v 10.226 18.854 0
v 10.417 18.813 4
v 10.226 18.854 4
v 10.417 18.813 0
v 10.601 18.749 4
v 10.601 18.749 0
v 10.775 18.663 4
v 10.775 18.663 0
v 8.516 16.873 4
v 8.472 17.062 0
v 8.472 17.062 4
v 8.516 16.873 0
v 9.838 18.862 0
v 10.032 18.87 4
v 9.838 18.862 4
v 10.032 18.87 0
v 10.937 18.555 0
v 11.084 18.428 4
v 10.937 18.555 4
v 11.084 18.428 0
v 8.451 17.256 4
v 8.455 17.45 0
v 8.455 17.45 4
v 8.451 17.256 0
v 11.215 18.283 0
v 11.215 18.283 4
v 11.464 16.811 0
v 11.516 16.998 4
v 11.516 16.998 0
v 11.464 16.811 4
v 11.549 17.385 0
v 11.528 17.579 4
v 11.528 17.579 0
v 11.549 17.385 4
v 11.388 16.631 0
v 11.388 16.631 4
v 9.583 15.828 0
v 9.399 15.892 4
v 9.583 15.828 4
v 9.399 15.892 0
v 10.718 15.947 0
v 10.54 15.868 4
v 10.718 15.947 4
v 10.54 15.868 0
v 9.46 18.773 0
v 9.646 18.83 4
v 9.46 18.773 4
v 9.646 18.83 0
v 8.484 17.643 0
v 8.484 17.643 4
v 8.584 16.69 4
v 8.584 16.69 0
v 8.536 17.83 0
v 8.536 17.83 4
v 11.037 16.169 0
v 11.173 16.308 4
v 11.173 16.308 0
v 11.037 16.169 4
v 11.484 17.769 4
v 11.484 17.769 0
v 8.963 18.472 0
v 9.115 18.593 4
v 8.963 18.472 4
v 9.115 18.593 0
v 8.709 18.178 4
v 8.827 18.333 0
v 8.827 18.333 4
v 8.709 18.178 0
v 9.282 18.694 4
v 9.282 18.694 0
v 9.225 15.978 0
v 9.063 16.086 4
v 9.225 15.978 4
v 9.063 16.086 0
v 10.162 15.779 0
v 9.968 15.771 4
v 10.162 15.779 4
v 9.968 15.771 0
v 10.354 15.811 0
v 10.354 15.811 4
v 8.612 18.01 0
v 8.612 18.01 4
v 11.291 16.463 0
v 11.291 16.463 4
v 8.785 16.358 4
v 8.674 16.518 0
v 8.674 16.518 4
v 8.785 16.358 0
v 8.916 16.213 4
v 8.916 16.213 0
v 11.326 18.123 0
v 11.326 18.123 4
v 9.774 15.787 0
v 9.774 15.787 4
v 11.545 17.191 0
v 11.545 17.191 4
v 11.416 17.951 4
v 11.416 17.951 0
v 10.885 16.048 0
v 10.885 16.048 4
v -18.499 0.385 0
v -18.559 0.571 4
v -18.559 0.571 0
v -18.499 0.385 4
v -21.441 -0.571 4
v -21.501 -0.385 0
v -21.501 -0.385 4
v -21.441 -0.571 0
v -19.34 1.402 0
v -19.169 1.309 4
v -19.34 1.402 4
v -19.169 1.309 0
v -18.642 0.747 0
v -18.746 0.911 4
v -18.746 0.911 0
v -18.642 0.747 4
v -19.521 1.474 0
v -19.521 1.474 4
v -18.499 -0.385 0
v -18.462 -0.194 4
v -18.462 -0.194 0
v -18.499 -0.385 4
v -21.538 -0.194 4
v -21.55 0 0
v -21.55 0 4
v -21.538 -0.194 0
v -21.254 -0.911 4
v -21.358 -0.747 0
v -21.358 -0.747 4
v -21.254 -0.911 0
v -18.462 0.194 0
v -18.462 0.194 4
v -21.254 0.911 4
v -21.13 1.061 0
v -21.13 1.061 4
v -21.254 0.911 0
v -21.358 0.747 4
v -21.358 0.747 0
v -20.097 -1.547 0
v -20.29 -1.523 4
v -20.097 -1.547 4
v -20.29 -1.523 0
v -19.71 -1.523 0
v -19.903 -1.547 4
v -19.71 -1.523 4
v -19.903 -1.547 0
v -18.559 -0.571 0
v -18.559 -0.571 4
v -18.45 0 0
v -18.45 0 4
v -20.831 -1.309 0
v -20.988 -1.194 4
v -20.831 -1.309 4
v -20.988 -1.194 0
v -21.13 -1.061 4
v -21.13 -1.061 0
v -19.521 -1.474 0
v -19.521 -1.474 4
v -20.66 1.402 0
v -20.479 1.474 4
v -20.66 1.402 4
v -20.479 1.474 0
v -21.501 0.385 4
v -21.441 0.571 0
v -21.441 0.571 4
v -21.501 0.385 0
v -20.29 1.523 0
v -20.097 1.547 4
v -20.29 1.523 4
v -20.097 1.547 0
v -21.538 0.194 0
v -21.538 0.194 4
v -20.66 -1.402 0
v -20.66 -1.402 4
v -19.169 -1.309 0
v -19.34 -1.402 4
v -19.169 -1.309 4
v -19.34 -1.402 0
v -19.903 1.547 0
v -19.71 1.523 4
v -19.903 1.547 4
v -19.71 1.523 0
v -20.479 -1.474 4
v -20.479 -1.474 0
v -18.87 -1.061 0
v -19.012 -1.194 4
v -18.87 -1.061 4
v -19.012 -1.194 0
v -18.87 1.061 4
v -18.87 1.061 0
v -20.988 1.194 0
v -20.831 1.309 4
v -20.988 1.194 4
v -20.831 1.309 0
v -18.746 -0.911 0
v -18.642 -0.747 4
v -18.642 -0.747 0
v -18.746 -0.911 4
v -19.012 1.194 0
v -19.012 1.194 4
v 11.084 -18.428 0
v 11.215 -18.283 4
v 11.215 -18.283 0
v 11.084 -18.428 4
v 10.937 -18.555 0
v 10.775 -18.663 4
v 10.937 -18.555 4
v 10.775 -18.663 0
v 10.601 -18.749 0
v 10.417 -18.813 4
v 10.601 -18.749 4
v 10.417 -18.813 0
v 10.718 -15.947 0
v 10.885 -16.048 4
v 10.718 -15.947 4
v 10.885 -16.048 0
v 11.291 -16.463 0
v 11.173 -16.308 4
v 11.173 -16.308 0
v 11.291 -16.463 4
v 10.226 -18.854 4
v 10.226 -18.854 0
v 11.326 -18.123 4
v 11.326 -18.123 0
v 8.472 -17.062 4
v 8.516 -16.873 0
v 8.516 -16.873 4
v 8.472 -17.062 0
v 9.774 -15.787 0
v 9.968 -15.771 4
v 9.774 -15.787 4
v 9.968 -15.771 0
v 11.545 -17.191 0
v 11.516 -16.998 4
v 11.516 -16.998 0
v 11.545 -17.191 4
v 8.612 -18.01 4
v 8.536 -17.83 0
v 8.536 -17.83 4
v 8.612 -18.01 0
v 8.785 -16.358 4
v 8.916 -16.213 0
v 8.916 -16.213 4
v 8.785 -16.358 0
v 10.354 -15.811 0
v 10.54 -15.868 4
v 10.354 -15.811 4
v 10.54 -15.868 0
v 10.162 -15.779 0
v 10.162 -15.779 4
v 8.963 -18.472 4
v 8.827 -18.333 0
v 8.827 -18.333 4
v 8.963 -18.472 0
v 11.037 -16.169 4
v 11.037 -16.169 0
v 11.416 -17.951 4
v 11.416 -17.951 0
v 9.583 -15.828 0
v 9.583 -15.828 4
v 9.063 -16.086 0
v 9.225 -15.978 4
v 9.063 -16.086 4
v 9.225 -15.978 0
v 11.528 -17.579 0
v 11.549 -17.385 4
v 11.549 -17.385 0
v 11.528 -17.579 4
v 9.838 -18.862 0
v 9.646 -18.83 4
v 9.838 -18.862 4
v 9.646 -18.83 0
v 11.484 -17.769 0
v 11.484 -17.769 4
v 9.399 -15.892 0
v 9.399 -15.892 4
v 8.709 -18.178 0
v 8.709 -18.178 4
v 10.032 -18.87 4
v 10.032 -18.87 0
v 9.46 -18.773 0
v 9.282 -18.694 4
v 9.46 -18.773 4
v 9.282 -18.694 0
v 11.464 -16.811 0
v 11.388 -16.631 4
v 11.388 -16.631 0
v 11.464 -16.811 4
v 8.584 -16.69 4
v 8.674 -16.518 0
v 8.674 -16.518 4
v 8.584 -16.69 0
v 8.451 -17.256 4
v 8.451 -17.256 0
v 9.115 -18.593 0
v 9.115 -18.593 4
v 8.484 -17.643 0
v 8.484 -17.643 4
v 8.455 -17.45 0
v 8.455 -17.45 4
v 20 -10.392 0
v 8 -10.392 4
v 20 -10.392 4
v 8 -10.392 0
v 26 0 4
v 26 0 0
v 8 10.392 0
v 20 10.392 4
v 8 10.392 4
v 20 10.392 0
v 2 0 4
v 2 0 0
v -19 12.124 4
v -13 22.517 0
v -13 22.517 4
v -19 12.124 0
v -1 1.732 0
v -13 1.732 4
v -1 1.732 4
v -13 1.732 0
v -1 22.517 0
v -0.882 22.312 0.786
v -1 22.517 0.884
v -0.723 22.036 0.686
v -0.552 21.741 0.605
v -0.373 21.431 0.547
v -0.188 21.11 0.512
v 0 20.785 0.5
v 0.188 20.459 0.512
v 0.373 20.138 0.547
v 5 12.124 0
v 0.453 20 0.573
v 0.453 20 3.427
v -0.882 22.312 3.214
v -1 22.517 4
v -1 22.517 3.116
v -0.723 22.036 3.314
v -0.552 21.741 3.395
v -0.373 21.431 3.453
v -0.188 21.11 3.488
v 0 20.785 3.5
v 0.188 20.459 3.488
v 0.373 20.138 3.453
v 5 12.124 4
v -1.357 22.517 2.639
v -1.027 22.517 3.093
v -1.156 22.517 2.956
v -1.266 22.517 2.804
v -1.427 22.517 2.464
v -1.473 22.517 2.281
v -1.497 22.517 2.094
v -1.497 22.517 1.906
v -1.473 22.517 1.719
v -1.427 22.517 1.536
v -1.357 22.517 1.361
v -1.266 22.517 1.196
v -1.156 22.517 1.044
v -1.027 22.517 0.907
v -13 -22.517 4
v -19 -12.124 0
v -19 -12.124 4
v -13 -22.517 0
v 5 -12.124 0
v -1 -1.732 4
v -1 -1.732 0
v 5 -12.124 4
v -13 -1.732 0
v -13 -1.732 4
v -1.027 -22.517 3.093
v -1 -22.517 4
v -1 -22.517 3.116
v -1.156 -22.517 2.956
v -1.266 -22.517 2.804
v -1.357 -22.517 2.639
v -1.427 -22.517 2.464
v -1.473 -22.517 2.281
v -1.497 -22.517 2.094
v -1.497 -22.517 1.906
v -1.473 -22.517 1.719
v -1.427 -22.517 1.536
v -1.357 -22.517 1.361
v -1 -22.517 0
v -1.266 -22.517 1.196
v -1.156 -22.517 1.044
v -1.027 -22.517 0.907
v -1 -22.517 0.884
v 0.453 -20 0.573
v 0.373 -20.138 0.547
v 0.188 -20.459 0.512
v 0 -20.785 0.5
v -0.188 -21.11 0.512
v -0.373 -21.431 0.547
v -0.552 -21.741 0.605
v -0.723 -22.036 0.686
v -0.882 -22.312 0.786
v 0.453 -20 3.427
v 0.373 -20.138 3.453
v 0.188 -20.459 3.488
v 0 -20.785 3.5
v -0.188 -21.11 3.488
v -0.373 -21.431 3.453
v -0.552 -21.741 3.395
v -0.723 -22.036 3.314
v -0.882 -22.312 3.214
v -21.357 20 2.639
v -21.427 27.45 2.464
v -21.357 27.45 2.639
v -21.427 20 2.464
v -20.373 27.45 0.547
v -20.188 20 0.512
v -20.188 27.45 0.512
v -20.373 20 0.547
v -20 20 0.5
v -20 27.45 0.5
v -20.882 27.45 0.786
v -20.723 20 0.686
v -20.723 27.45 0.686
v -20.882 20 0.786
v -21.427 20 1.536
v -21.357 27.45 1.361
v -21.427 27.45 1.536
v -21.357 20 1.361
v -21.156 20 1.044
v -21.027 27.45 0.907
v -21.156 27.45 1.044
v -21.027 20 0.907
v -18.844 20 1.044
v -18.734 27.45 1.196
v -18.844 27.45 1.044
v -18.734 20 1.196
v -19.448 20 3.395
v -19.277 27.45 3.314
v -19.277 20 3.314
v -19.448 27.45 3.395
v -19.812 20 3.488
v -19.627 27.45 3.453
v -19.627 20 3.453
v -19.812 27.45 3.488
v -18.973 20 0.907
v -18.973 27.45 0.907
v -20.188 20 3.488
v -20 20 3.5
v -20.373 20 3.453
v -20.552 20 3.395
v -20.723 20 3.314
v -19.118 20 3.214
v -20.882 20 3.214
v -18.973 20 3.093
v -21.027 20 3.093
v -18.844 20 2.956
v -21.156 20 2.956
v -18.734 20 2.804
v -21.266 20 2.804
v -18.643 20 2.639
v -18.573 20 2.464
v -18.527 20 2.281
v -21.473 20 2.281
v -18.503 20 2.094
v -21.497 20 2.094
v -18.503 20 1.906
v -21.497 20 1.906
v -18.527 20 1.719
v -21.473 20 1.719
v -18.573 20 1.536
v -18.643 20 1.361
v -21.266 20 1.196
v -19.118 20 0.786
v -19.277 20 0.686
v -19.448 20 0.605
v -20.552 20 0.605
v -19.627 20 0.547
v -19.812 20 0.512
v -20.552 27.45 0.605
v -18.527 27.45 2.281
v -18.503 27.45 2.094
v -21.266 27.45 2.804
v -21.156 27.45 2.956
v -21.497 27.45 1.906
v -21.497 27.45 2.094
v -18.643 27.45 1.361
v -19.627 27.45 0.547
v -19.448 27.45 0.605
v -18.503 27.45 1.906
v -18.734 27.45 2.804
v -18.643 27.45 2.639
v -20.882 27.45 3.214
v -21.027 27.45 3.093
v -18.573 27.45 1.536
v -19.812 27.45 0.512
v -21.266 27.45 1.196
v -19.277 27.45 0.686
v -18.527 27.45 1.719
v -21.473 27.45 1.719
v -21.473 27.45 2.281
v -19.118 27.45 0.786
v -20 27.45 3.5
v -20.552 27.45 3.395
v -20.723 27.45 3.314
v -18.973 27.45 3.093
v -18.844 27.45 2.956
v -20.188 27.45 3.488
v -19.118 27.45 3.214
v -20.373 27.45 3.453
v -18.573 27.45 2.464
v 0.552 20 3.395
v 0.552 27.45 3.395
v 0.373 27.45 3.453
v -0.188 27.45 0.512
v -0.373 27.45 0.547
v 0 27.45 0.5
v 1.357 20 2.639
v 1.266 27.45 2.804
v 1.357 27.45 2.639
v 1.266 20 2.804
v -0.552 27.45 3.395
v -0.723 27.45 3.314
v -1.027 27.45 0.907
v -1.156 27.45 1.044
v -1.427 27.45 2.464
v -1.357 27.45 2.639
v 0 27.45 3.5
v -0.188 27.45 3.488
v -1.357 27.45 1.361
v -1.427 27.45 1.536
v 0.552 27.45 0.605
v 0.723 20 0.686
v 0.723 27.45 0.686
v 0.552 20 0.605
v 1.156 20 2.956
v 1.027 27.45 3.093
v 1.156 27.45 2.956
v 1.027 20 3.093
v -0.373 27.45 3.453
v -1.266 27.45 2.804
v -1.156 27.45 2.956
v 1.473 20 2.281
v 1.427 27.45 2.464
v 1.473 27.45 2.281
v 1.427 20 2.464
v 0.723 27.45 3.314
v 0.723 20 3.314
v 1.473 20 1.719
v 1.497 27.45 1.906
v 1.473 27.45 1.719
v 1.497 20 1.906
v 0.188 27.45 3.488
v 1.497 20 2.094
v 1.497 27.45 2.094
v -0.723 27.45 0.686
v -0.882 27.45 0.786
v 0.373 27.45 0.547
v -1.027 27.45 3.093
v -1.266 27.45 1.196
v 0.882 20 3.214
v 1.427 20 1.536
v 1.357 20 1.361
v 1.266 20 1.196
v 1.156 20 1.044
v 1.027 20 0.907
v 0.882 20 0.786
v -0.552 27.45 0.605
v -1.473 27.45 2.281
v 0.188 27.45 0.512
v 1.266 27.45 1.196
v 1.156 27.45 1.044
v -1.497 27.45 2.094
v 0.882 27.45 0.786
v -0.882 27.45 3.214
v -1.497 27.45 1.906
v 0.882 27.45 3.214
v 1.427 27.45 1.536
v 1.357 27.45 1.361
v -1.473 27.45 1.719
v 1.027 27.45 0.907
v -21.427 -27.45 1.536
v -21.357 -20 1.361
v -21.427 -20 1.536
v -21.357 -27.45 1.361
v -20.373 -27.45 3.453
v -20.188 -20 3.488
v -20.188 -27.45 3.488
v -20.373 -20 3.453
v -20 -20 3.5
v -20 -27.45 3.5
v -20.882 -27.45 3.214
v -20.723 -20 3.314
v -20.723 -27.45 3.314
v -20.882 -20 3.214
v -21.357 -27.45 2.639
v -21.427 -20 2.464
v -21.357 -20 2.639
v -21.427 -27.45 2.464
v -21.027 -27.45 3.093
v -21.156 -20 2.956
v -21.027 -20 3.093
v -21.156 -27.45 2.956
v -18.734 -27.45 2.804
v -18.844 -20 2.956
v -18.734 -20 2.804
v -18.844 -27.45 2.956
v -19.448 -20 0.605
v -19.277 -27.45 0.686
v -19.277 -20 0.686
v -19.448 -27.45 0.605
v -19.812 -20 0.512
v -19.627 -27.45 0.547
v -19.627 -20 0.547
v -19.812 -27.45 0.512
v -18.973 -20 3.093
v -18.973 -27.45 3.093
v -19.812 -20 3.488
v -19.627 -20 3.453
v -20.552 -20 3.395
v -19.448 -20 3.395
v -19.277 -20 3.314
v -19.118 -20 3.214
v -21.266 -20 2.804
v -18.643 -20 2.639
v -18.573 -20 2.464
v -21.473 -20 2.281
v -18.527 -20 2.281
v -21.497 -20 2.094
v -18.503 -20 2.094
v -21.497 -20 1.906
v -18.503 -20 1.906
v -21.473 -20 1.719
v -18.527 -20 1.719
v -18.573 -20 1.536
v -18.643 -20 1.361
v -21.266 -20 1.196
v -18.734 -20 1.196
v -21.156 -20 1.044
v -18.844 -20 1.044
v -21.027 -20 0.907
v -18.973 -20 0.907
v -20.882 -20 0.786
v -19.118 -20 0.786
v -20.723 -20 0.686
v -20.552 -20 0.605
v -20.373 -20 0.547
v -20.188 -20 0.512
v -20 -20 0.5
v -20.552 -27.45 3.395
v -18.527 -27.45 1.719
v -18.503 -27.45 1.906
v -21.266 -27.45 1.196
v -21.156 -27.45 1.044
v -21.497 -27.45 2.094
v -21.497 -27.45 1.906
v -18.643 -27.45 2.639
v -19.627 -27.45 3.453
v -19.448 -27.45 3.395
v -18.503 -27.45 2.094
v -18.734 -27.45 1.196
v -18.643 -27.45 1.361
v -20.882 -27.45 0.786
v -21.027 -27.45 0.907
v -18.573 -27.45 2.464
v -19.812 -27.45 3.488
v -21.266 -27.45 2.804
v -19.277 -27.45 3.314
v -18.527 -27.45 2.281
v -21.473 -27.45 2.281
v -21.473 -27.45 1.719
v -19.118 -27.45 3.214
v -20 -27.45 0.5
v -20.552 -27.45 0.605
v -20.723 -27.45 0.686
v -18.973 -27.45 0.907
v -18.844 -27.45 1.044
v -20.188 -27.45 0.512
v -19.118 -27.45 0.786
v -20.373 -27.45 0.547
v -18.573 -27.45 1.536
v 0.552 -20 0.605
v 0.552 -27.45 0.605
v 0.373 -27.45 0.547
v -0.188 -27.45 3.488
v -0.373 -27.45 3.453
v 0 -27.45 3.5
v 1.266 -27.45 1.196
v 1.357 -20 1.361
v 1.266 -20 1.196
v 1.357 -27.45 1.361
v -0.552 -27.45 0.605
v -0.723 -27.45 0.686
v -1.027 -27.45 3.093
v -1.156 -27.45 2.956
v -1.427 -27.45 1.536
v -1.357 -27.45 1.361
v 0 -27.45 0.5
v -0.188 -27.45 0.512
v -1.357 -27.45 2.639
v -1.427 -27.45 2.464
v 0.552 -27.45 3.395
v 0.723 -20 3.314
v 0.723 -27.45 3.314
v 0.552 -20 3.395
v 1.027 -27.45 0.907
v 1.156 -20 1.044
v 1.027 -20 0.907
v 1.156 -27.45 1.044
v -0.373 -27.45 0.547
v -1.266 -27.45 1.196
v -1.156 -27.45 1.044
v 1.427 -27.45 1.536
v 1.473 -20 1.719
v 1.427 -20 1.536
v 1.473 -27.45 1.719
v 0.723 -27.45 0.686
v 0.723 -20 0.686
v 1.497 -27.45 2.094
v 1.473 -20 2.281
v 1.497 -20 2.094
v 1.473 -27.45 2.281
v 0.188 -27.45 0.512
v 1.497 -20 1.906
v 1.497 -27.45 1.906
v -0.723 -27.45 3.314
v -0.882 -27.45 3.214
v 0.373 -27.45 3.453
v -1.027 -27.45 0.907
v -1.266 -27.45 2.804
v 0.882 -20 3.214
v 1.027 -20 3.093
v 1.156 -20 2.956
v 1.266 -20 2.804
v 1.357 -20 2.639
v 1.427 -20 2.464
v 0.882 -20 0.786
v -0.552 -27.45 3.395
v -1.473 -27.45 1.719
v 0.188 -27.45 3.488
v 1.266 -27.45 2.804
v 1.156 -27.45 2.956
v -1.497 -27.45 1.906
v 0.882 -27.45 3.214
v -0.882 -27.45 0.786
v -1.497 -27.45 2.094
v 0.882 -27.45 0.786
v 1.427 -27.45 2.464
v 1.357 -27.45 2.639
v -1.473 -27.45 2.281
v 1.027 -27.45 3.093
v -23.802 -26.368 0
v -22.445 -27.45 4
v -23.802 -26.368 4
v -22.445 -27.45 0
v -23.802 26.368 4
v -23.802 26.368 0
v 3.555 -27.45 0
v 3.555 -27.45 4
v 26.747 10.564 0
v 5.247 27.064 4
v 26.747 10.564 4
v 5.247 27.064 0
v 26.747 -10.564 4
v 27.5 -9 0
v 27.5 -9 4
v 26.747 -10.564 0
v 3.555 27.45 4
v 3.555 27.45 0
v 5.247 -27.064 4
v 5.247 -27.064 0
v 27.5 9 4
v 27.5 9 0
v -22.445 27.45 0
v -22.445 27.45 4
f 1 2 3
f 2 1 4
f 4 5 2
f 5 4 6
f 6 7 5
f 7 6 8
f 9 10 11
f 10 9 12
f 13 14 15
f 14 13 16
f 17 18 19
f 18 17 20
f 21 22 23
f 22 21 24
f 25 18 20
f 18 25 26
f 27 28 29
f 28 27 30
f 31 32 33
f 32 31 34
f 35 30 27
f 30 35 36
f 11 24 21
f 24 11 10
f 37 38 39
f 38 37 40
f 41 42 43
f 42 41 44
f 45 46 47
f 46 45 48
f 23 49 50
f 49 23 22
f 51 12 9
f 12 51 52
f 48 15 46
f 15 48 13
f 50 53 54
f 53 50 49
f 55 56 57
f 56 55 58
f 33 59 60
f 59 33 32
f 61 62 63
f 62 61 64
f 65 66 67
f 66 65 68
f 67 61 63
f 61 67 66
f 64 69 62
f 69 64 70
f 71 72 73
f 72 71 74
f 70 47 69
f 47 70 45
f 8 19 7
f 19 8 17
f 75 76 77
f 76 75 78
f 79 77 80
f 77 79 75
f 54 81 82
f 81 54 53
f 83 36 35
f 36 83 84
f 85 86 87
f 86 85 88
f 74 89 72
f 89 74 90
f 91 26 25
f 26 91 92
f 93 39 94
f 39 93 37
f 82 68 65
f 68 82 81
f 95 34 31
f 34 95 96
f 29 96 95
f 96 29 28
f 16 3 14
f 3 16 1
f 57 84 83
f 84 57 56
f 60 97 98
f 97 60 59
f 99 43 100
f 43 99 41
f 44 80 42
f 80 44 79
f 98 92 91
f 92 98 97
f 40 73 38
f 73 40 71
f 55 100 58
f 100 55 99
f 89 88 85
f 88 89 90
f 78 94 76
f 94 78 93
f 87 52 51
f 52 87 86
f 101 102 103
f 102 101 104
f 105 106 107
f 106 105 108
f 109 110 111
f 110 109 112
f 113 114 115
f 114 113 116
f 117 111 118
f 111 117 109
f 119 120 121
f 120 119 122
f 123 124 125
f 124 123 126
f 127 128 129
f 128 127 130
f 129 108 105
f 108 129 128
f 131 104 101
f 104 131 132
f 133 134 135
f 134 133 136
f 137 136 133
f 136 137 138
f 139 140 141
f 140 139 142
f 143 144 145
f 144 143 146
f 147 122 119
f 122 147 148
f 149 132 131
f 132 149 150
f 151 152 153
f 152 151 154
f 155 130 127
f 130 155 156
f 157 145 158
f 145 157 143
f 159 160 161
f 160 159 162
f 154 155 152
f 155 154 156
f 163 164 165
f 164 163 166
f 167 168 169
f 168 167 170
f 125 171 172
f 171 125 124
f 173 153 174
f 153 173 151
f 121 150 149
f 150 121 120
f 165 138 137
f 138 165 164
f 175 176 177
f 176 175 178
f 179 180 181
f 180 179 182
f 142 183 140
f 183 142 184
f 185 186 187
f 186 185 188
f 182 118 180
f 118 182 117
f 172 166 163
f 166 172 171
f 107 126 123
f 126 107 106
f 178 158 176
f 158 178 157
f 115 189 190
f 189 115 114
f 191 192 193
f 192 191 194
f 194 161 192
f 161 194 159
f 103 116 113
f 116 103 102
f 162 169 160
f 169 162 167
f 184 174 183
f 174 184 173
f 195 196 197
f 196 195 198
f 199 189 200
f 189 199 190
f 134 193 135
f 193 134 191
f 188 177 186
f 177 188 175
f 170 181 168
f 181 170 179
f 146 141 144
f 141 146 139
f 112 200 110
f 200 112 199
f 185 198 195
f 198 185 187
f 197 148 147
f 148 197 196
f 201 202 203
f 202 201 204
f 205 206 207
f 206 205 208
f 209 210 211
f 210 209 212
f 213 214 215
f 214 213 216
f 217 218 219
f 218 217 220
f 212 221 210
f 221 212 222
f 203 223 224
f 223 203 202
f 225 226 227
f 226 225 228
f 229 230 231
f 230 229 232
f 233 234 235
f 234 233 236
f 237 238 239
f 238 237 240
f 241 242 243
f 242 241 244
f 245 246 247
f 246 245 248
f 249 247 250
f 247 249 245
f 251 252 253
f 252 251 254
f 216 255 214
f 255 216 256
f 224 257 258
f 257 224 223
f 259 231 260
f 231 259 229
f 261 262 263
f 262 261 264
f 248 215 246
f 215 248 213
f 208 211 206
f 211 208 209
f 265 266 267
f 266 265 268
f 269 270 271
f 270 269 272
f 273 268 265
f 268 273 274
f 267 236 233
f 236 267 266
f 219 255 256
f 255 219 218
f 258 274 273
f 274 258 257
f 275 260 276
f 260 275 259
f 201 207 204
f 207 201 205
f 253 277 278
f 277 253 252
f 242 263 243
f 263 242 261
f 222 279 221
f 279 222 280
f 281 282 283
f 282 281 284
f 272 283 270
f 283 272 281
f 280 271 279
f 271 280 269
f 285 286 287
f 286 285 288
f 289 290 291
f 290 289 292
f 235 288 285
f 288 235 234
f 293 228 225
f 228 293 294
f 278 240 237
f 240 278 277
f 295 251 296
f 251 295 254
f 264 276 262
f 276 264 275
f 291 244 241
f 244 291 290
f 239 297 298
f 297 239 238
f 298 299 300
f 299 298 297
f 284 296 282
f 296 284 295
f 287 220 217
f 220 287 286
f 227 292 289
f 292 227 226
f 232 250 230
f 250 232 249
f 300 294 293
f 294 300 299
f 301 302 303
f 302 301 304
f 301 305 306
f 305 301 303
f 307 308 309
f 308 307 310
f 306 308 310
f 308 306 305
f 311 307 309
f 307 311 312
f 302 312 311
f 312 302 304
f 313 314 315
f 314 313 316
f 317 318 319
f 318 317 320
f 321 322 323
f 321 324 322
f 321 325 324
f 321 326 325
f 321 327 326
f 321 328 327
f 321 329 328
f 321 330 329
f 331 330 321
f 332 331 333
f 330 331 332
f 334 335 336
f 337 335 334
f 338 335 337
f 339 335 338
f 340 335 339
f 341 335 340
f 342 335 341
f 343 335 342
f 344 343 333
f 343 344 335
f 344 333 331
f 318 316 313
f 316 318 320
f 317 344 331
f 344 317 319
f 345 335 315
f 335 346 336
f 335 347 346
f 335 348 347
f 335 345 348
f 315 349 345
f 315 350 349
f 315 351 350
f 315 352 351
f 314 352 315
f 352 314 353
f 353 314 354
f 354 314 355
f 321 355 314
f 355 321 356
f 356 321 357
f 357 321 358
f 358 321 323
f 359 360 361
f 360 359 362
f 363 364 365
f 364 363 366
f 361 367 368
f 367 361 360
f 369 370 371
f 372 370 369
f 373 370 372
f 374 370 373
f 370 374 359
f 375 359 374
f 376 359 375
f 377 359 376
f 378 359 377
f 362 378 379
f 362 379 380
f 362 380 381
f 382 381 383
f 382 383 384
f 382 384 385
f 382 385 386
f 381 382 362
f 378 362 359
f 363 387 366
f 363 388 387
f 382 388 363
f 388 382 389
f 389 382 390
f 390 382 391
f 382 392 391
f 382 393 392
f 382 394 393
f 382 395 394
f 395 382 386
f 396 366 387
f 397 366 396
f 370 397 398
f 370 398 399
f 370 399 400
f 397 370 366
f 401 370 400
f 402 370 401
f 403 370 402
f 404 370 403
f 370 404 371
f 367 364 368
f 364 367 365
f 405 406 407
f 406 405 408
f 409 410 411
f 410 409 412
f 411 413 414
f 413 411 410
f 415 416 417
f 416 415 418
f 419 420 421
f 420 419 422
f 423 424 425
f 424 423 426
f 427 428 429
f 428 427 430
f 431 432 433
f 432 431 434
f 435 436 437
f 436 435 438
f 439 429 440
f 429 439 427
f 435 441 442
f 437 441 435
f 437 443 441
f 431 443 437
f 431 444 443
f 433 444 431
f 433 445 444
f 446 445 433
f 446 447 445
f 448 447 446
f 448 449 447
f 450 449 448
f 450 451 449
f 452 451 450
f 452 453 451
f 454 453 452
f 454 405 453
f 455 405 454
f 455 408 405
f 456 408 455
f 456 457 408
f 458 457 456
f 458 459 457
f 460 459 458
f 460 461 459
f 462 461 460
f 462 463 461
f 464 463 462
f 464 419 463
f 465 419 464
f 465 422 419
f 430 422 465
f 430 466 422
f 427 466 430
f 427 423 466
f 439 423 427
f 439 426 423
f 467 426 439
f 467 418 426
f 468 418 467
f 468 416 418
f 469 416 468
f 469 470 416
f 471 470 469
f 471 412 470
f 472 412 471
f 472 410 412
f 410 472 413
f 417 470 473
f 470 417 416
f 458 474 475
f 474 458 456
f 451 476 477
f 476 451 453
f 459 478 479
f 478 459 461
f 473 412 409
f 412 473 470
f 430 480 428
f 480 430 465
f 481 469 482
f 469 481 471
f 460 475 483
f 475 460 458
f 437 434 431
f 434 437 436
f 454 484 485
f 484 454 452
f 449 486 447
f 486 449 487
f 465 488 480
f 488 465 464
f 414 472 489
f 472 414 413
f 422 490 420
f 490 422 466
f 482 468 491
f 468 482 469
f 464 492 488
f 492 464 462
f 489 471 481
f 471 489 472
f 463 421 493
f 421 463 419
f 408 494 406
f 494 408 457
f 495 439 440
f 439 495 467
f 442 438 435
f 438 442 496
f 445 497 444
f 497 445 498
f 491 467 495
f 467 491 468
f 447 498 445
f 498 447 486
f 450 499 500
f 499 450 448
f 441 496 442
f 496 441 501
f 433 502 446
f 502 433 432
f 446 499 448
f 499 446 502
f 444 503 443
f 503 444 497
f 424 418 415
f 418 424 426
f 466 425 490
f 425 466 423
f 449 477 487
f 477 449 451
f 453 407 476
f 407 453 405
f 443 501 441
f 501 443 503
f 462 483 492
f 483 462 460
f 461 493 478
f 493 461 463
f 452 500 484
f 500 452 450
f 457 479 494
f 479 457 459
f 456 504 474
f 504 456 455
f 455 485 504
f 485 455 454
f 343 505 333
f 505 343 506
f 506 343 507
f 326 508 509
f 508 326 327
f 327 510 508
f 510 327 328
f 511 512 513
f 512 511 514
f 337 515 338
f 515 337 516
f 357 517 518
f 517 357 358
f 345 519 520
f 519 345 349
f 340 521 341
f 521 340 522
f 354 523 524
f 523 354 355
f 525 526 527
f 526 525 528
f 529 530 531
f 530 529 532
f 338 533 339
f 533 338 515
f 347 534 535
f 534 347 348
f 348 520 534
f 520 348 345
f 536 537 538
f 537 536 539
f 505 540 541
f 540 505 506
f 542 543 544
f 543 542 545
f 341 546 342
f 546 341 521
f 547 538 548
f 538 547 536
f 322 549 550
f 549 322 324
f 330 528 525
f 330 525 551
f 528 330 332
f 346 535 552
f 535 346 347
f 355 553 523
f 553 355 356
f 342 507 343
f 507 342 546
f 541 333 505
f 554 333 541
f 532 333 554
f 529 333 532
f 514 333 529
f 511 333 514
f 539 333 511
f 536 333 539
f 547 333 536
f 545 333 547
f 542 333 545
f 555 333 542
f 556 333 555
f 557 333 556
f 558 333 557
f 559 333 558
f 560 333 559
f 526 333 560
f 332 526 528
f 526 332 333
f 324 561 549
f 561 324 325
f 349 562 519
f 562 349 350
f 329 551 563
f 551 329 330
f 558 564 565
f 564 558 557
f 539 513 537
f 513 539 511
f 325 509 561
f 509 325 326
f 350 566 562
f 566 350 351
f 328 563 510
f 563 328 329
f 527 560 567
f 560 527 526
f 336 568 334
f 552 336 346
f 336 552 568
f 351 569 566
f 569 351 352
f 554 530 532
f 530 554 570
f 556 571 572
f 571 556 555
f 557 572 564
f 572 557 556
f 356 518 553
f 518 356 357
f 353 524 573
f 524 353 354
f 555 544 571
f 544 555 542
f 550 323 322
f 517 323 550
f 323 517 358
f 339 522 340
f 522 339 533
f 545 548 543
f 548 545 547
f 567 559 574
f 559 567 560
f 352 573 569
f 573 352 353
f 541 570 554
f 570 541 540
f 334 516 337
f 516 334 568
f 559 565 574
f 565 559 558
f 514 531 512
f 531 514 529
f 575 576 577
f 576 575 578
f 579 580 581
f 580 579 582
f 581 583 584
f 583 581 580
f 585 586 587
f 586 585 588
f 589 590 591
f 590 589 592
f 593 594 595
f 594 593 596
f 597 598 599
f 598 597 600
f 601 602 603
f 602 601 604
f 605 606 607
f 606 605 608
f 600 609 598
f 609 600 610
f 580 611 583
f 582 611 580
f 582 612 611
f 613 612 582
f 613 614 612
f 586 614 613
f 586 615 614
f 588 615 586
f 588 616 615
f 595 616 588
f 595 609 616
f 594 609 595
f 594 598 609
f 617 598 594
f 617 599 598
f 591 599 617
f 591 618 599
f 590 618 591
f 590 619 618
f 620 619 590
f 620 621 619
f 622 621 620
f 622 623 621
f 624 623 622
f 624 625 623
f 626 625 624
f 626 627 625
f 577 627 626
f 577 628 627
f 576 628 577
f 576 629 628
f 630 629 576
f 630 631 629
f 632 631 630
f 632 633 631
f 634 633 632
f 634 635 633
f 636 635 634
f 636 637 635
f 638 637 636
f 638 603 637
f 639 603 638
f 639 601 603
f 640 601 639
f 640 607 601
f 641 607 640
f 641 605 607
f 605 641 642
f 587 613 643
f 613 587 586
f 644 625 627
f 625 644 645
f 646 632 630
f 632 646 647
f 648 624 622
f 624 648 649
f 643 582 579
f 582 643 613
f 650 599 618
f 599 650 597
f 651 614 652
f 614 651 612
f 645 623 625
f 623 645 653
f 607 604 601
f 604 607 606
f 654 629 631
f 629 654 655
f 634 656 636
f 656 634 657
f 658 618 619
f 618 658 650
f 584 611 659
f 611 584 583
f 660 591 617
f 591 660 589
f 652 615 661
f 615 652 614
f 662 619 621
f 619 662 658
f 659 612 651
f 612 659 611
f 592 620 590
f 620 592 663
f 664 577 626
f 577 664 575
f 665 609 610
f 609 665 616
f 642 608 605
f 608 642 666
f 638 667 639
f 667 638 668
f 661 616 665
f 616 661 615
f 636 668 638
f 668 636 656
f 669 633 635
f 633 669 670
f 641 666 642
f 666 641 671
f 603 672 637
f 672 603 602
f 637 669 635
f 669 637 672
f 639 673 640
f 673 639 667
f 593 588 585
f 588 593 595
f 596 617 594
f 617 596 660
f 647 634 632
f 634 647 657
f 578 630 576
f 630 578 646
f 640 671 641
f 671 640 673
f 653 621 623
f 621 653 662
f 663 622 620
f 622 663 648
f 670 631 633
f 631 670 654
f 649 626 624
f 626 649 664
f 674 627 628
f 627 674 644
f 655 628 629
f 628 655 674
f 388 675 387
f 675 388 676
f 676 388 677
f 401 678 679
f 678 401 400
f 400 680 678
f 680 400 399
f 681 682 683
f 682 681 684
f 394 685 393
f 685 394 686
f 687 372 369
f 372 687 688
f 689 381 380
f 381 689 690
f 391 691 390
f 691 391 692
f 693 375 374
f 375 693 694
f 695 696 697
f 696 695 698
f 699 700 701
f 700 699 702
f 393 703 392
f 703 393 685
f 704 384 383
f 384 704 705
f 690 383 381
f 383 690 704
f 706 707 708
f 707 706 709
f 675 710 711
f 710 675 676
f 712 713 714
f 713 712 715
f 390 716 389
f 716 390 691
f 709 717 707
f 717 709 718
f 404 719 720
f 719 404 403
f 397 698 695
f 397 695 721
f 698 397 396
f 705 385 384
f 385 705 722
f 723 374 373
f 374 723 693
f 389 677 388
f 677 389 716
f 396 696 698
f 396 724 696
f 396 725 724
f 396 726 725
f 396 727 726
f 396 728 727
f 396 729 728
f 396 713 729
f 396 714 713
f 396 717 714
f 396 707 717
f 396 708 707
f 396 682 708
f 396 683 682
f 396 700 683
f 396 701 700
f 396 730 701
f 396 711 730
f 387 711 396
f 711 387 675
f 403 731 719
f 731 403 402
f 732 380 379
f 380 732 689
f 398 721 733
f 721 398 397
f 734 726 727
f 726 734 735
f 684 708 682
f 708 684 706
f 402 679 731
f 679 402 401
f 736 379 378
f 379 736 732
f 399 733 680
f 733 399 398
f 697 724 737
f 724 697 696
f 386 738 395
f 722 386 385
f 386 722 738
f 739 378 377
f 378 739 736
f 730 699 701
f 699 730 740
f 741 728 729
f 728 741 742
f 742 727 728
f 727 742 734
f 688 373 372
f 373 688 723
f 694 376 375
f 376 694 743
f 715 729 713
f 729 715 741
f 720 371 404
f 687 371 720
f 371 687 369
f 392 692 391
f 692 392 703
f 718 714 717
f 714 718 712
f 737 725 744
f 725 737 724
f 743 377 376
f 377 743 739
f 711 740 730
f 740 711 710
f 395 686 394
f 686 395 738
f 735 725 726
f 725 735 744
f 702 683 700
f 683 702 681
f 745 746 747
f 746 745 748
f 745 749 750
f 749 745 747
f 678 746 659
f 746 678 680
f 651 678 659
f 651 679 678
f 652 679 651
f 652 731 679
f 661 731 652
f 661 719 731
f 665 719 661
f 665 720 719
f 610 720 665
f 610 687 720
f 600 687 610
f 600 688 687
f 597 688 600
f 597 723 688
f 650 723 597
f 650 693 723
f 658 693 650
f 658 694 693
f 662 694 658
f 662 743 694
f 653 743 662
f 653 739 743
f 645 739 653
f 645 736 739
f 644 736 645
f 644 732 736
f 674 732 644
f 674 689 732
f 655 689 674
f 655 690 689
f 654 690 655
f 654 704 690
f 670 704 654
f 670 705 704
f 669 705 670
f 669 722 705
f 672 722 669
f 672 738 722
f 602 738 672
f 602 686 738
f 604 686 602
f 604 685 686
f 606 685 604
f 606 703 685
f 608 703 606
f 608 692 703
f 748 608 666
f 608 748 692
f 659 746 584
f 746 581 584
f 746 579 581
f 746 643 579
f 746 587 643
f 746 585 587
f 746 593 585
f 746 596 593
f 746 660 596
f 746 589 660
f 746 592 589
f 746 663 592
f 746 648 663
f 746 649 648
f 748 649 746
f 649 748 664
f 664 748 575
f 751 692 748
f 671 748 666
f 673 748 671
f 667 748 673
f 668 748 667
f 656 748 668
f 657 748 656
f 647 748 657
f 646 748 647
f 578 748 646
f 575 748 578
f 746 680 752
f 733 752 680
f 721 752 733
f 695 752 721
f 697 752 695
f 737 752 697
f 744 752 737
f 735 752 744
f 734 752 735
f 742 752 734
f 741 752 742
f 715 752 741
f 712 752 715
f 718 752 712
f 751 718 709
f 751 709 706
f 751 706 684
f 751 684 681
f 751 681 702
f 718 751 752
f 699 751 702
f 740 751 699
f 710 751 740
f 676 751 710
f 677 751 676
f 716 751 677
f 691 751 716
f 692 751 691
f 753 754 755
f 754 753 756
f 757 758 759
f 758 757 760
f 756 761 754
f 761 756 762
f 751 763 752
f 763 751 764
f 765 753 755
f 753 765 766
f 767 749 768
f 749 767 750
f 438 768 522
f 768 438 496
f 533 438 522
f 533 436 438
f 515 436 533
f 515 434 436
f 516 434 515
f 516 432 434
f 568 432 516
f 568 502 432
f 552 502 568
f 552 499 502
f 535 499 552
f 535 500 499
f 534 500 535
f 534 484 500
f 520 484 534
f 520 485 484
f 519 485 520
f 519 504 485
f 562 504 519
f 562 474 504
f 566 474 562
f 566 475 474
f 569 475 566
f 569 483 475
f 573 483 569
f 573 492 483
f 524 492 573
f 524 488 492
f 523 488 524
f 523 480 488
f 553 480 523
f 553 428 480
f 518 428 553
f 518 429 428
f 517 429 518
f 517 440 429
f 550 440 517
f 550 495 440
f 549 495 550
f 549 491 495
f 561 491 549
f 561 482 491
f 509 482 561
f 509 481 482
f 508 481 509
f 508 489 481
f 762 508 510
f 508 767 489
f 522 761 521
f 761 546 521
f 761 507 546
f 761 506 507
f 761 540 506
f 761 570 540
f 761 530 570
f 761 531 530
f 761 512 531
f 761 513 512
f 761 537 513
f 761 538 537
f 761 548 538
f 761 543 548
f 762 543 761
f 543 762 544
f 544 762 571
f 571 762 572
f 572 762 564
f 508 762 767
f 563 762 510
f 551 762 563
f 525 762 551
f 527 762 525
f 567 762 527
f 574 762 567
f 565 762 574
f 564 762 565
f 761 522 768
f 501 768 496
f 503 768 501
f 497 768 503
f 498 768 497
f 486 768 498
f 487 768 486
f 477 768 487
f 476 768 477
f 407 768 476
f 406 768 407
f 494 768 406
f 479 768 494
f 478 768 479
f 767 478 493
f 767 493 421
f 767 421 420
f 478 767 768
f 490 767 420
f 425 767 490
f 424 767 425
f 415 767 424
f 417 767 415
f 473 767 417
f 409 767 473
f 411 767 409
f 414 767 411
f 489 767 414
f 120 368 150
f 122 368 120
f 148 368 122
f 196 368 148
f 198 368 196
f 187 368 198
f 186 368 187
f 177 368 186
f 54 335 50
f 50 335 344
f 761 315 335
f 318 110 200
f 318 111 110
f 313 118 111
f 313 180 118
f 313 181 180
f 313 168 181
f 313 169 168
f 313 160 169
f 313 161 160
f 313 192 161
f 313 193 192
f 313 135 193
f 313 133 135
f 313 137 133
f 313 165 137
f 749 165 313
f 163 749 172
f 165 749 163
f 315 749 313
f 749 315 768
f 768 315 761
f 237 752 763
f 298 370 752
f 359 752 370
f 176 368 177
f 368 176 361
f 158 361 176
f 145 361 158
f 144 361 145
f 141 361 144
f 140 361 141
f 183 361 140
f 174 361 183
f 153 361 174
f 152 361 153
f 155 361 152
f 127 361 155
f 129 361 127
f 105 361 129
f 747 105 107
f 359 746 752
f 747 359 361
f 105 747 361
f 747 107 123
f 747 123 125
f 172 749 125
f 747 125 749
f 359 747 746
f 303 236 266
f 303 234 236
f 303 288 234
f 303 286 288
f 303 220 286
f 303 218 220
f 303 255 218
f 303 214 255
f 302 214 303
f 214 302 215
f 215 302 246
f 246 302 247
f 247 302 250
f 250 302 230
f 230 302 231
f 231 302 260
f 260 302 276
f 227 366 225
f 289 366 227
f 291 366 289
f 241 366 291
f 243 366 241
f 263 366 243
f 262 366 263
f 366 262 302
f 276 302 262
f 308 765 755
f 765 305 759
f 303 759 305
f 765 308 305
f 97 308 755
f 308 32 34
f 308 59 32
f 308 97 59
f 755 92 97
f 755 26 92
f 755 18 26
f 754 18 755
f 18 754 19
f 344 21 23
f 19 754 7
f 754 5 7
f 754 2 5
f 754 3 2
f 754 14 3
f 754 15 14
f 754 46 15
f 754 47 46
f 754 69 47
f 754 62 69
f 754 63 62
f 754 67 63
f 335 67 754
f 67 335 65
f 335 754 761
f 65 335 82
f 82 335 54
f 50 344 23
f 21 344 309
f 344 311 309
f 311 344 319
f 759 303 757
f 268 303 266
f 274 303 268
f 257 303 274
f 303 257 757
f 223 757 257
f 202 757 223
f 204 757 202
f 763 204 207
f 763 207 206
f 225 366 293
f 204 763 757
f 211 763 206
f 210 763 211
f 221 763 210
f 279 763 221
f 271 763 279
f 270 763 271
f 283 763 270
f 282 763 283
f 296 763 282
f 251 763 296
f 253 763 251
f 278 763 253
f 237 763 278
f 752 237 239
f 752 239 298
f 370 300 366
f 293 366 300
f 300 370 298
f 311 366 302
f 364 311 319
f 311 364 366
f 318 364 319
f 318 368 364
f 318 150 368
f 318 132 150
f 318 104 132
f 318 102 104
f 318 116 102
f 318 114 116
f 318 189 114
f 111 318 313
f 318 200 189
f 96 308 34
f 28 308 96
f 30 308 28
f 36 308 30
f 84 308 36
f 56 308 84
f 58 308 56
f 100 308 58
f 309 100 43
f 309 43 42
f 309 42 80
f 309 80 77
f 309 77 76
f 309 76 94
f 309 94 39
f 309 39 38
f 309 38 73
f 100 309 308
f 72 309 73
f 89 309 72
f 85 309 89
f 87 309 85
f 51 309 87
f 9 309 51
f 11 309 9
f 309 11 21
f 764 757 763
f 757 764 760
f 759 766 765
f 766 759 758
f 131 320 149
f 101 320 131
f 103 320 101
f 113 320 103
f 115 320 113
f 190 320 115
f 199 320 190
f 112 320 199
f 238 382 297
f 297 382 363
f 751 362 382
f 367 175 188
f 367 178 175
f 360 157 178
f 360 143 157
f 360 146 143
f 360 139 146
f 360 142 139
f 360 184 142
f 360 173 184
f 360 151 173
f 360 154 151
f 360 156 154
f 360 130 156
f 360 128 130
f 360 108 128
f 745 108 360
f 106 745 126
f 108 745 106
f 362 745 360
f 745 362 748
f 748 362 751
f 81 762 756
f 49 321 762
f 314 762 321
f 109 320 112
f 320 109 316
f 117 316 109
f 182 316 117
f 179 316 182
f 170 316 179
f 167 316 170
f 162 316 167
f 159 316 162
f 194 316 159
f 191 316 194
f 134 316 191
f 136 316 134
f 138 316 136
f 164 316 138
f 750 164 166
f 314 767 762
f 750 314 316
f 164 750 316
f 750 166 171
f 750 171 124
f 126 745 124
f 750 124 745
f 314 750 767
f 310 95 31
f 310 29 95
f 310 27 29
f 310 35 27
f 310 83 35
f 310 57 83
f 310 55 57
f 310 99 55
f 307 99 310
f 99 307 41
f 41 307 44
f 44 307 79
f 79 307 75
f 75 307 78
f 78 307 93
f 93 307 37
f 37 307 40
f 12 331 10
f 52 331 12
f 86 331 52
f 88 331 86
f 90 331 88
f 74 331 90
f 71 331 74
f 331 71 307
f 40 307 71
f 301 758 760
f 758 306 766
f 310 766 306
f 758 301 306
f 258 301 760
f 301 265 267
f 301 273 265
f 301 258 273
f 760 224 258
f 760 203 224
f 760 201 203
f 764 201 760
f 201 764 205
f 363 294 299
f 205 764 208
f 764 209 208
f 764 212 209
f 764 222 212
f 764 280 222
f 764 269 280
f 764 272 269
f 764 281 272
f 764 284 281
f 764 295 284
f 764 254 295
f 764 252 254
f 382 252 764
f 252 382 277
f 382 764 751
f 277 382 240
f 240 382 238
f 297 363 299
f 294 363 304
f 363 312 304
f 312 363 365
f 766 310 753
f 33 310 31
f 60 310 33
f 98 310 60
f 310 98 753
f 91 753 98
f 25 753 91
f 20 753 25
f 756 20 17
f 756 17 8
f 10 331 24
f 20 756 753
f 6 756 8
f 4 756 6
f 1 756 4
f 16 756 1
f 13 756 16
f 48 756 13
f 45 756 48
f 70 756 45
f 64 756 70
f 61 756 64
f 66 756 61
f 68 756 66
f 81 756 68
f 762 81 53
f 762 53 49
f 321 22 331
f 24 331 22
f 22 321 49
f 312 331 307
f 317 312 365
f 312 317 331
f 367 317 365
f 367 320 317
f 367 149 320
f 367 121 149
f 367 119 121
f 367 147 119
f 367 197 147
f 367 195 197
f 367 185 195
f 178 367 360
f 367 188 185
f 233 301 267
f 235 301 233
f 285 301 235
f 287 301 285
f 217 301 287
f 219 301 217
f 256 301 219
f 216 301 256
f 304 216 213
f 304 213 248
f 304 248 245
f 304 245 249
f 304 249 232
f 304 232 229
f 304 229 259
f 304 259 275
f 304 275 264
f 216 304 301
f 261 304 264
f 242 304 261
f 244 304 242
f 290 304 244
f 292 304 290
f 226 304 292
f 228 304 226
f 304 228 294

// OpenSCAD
// file: myshapes.scad
 /*
  * Copyright [2017] [Saul Castro]

    Licensed under the Apache License, Version 2.0 (the "License");
    you may not use this file except in compliance with the License.
    You may obtain a copy of the License at
    
        http://www.apache.org/licenses/LICENSE-2.0
    
    Unless required by applicable law or agreed to in writing, software
    distributed under the License is distributed on an "AS IS" BASIS,
    WITHOUT WARRANTIES OR CONDITIONS OF ANY KIND, either express or implied.
    See the License for the specific language governing permissions and
    limitations under the License.

  */
  
  
/*==================================================
==================	Extention of basic shape with shot sintax =====================
==================================================*/
//all shapes centered at 0, 0 for easy rotation

// r prefix rounded
//rrc(10, 20 ,30, 4, 5);
//sp(11, 44);

fn = 50;

module c(w, l, d){
    translate([0,0,0]) cube([w, l, d], center=true);
}

module cy(d, h){  
    translate([0,0,0])    cylinder(d=d, h=h, $fn=fn, center=true);
}
module cy(d, h, f){  
    translate([0,0,0])    cylinder(d=d, h=h, $fn=f, center=true);
}

module sp(d, f){  
    translate([0,0,0])    sphere(d=d, $fn=f);
}

module rcy(d, h, c, fn){
	minkowski(){
			sp(c);
			cy(d-c, h-c, fn);
        }
}

module rc(w, l, d, c){
    hull(){
            translate([w/2-c/2,l/2-c/2,0]) cy(c, d);
            translate([w/2-c/2,-l/2+c/2,0]) cy(c, d);
            translate([-(w/2-c/2),l/2-c/2,0]) cy(c, d);
            translate([-(w/2-c/2),-l/2+c/2,0]) cy(c, d);
    }
    
}

module rrc(w, h, d, c, s){
          translate([0,0,0])  minkowski(){
			sp(s);
			rc(w-s, h-s, d-s, c);
        }
}



module slot(d, h, l){
    hull(){
        holes(d, h, l);
    } 
}

module cn(d, d2, h ,h2  , ff = fn ){ 
         rotate([0,0,90])  hull(){ 
                 translate([ 0, 0, h/2])   cy(d2, h, ff);  
                 translate([ 0, 0, h2/2])  cy(d, h2, ff); 
          }
}
                   

  
module cs(d, d2, h, x ){
    
                  for(i=[-1,1])  translate([ i*x/2, 0, 0])  cn(d, d2, h/3, h);
}

module holes(d, h, x, ff = fn){
    
                  for(i=[-1,1])  translate([ i*x/2, 0, h/2])  rotate([0,0,90]) cy(d, h, ff); 
}
                   
  
// file: servo mount 37g.scad
use <myshapes.scad>
 
 /*
		 9g servo mount . m2 inserts
 */
 
 w = 20 + 1; 
 x = 8 + .6; 
 y = 30;
z = 8;
c = 8;
p = 5;

  hd = 24;
  
    h2 = 3; 
    h3 = 3.3;
    h2i = 2.2; //3.7; 
    h3i = 5.2; 

fn = 150;

//%cy(110, 1, 50);  
 
//sidemount();

//rotate([-90,0,0])
//smnt();
//mn2();

//arm(24);
//tmnt();

rin();
module rin( ){
     difference(){
         union(){
            translate([  0, 0,7.5/2])   cy( 27, 7.5, fn); 
             hull(){
            translate([  0, 0,2])   cy( 27, 4, fn); 
            translate([  -13, 28,2])   cy( 6, 4, fn); 
            for(i=[-1,1])  translate([  i*10+2, 32,2])   cy( 8, 4, fn);  
            for(i=[-1,1])  translate([  i*12, 18,2])   cy( 8, 4, fn);  
             }
         }
            translate([  0, 0,6])   cy( 22.8, 22, fn); 
            translate([  0, -16,2])   cy( 3.2, 11, fn); 
            translate([  0, 0,4])   cy( 7.4, 24, fn);
            translate([  0, 0, -1]) rotate([0,0, 0])  holes(3.1, 24, 15);
         
            translate([  3, 33, -1]) rotate([0,0, 0])  holes(3.1, 24, 20);
             translate([ 0, 24, 4])   servo();
        }
    }
    
    
module mn2(){ 
    of = 13;
    oo = 19;
	difference(){
        union(){
            hull(){
               translate([ of, oo+5, p/2])    cy(11, p, fn);
               translate([ 0, 0, p/2])    rc(38, x+3, p, 2);
//                  for(i=[-1,1])  translate([ i*25, 0, p/2]) cy(c, p, fn); 
                  } 
        }    
                    for(i=[-1,1])  translate([ of , oo + i*5, c/2])  cy(h3, w, fn); 
                    for(i=[-1,1])  translate([ of , oo+ i*5, w/2+2.5])  cy(8, w, fn); 
//                    for(i=[-1,1])  translate([ i*25, 0, c/2])  cy(h3, w, fn); 
            translate([ 0, 0, 5])   servo();
    } 
}




module tmnt(){ 
	difference(){
        union(){
               translate([ 0, 0, p/2])    rc(38, x+3, p, 2);
            hull(){
               translate([ 20, 0, p/2])    rc(8, x+3, p, 2);
                  for(i=[-1,1])  translate([ 30,i*5,  p/2]) cy(11, p, fn); 
                  }    
                  translate([ 22, 0, p/2+2])   cy(8, p+2, fn);
        }    
               translate([ 22, 0, p/2])   cy(h3, p*3, fn);
        
                    for(i=[-1,1])  translate([ 30,i*5,  p/2])  cy(h3, w, fn); 
                    for(i=[-1,1])  translate([ 30,i*5,  w/2+ 2])  cy(8, w, fn); 
            translate([ 0, 0, 5])   servo();
    } 
}


module piv(){
          translate([0,7.5, 0]) 
        arm(15);
          translate([15,0, 0]) 
        rotate([0,0,90])
        arm(30); 

        rotate([0,0,60])
        translate([10,-7,2]) c(2,24, 4);  
}

module arm(l, d=4){  
	difference(){
		union(){ 
                for(i=[-1,1])  translate([ 0, i*l/2 , d/2])   cy(  c    , d, fn);  
                translate([0,0,d/2]) rc(5, l, d, 2);  
		} 
				for(i=[-1,1])  translate([ 0, i*l/2 , d/2])   cy(  h3- (i==-1 ? 1.1:0) , d*2, fn);   //   
	}
}    

module mn(){ 
	difference(){
        union(){
            hull(){
               translate([ 0, 22, p/2])    rc(22, x, p, x-1 );
               translate([ 0, 0, p/2])    rc(38, x+3, p, 2);
//                  for(i=[-1,1])  translate([ i*25, 0, p/2]) cy(c, p, fn); 
                  } 
        }    
                    for(i=[-1,1])  translate([ i*5, 22, c/2])  cy(h3, w, fn); 
                    for(i=[-1,1])  translate([ i*5, 22, w/2+2.5])  cy(8, w, fn); 
//                    for(i=[-1,1])  translate([ i*25, 0, c/2])  cy(h3, w, fn); 
            translate([ 0, 0, 5])   servo();
    } 
}


module smnt(){ 
	difference(){
        union(){
            hull(){
               translate([ 0, 0, z/2])    rc(38, x+4, z, 2);
                  for(i=[-1,1])  translate([ i*25, x/4+2, c/2]) rotate([90,0,0])  cy(c, x/2, fn); 
                  } 
        }    
                    for(i=[-1,1])  translate([ i*25, 0, c/2]) rotate([90,0,0])   cy(h3, w, fn); 
                    for(i=[-1,1])  translate([ i*25, 4-w/2, c/2]) rotate([90,0,0])   cy(6, w, fn); 
            translate([ 0, 0, 7])   servo();
    } 
}

module mnt(){ 
	difference(){
        union(){
            hull(){
               translate([ 0, 0, p/2])    rc(38, x+3, p, 2);
                  for(i=[-1,1])  translate([ i*25, 0, p/2]) cy(c, p, fn); 
                  } 
        }    
                    for(i=[-1,1])  translate([ i*25, 0, c/2])  cy(h3, w, fn); 
            translate([ 0, 0, 5])   servo();
    } 
}


module sidemount(){ 
	difference(){
        union(){
               translate([ 0, 0, x/2])    rc(38, x+2, x, 2);
            hull(){
                  for(i=[-1,1])  translate([ i*25, 0, z/2]) cy(c, z, fn); 
                  } 
        }    
                    for(i=[-1,1])  translate([ i*25, 0, c/2])  cy(h3, w, fn); 
            translate([ 0, -7, 8])   rotate([90,0,0])  servo();
    } 
}


module servo(){
        union(){
                  for(i=[-1,1])  translate([ i*hd/2, 0, 0])  cy(h2i, w, fn); 
                  translate([ 0, 0, 0])    rc(y, x, 3, 2);
 
                  translate([ 0, 0, -z])    c(w, x, w);	 
        } 
}

 
 

  


	
	
// main file
use <servo mount 37g.scad>
use <myshapes.scad>
   
hole = 7.5;   
hh = 3.5;
 hd = 33;

fn = 50;

//%cy(110, 1, 50);  


a = 24;
d = 4;
y =7;
z = 14;

//cy(111, 1, fn);
 
//            translate([  13, 80, 36])
chas();
 
//mtr();
//            translate([  0, 55, 6]) rotate([90,90, 0])  
//pv();
//
//            translate([  0, 52, 6]) rotate([90,0, 0])  
//
//rin();
//t();

module t( ){
     difference(){ 
         translate([  0, 0,2])   cy( 12, 4, 6);  
            translate([  0, 0,4])   cy( 7.4, 24, fn);
        }
    }
 
    
module pv( ){
     difference(){
         union(){
            translate([  0, 0,6])   cy( 22, 12, fn); 
             hull(){
            translate([  0, 0,2])   cy( 25, 4, fn); 
            translate([  0, -15,2])   cy( 11, 4, fn); 
             }
         }
            translate([  0, -16,2])   cy( 3.2, 11, fn); 
            translate([  0, 0,4])   cy( 7.4, 24, fn);
            translate([  0, 0, -1]) rotate([0,0, 90])  holes(3.1, 24, 15);
        }
    }
    
    
 module mtr( ){
     difference(){
     union(){
//            translate([  0, 0,0])   link();
         translate([  0, 0, 22]) rotate([0,180, 0])    cn(62+3, 60+3, 22, 11);
            
         translate([  0, 36, 6]) rotate([90,0, 0])  rc(22, 12, 11, 3);
        }
         translate([  0, 42, 6]) rotate([90,0, 0])  holes(3.1, 11, 15);
         translate([  0, 22, 0]) rotate([90,0, 0])  cy(2, 44, fn);
     difference(){
            translate([  0, 0,23]) rotate([0,180, 0])    cn(62, 60, 24, 11);
         
            translate([  0, 0,-1])   cy( 12, 24, 6);
        for(i=[0:2]) translate([0,0 ,0]) rotate([0,0, i*120])   translate([  0, 24]) c(3.5, 40, 11);
        }
            translate([  0, 0,4])   cy( 7.5, 24, fn);
    }
}

 module chas( ){
     difference(){
     union(){
//        for(i=[0:2]) translate([0,i==0? -11:0 ,0]) rotate([0,0, i*120]) link();
            
            hull(){
             translate([  22, 0, d/2])  rc(11, 22, d, d);
             translate([ -9, 0, d/2])  rc(30, 55, d, d);
            }
//              translate([  0, -y, 0]) rotate([0,0, 90]) slot(24, 8, 22);
    }
//              translate([  0, -y, -1]) rotate([0,0, 90]) slot(hole, 22, 22);
//              translate([  0, -y, 5]) rotate([0,0, 90]) slot(17.7, z, 22);
    
        for(i=[0:2]) translate([0,0 ,0]) rotate([0,0, i*120+60])  
                            translate([   20, 0,z/2-1]) cy(3.1, z, fn); 
        
        
        for(i=[0:2]) translate([0,0 ,0]) rotate([0,0, i*120])  
                            translate([   a/2+2, 0,z/2-1]) cy(a, z, 6); 
        
              for(i=[-1,1])  translate([  -10, -20*i, d/2]) rotate([90*i,0, 0])  holes(3., 24, 20);
    }
     
 }
 
 module link( ){
     dd = 40; 
     ee = 40;
     difference(){
             union(){ 
                 hull(){
                    translate([  0, ee-33, d/2 ])  cy(a-11, d, 6);
                    translate([  0, ee, d/2 ])    cy(a , d, 6);
                 }   
                    }
              
        }
}
 

  
	
